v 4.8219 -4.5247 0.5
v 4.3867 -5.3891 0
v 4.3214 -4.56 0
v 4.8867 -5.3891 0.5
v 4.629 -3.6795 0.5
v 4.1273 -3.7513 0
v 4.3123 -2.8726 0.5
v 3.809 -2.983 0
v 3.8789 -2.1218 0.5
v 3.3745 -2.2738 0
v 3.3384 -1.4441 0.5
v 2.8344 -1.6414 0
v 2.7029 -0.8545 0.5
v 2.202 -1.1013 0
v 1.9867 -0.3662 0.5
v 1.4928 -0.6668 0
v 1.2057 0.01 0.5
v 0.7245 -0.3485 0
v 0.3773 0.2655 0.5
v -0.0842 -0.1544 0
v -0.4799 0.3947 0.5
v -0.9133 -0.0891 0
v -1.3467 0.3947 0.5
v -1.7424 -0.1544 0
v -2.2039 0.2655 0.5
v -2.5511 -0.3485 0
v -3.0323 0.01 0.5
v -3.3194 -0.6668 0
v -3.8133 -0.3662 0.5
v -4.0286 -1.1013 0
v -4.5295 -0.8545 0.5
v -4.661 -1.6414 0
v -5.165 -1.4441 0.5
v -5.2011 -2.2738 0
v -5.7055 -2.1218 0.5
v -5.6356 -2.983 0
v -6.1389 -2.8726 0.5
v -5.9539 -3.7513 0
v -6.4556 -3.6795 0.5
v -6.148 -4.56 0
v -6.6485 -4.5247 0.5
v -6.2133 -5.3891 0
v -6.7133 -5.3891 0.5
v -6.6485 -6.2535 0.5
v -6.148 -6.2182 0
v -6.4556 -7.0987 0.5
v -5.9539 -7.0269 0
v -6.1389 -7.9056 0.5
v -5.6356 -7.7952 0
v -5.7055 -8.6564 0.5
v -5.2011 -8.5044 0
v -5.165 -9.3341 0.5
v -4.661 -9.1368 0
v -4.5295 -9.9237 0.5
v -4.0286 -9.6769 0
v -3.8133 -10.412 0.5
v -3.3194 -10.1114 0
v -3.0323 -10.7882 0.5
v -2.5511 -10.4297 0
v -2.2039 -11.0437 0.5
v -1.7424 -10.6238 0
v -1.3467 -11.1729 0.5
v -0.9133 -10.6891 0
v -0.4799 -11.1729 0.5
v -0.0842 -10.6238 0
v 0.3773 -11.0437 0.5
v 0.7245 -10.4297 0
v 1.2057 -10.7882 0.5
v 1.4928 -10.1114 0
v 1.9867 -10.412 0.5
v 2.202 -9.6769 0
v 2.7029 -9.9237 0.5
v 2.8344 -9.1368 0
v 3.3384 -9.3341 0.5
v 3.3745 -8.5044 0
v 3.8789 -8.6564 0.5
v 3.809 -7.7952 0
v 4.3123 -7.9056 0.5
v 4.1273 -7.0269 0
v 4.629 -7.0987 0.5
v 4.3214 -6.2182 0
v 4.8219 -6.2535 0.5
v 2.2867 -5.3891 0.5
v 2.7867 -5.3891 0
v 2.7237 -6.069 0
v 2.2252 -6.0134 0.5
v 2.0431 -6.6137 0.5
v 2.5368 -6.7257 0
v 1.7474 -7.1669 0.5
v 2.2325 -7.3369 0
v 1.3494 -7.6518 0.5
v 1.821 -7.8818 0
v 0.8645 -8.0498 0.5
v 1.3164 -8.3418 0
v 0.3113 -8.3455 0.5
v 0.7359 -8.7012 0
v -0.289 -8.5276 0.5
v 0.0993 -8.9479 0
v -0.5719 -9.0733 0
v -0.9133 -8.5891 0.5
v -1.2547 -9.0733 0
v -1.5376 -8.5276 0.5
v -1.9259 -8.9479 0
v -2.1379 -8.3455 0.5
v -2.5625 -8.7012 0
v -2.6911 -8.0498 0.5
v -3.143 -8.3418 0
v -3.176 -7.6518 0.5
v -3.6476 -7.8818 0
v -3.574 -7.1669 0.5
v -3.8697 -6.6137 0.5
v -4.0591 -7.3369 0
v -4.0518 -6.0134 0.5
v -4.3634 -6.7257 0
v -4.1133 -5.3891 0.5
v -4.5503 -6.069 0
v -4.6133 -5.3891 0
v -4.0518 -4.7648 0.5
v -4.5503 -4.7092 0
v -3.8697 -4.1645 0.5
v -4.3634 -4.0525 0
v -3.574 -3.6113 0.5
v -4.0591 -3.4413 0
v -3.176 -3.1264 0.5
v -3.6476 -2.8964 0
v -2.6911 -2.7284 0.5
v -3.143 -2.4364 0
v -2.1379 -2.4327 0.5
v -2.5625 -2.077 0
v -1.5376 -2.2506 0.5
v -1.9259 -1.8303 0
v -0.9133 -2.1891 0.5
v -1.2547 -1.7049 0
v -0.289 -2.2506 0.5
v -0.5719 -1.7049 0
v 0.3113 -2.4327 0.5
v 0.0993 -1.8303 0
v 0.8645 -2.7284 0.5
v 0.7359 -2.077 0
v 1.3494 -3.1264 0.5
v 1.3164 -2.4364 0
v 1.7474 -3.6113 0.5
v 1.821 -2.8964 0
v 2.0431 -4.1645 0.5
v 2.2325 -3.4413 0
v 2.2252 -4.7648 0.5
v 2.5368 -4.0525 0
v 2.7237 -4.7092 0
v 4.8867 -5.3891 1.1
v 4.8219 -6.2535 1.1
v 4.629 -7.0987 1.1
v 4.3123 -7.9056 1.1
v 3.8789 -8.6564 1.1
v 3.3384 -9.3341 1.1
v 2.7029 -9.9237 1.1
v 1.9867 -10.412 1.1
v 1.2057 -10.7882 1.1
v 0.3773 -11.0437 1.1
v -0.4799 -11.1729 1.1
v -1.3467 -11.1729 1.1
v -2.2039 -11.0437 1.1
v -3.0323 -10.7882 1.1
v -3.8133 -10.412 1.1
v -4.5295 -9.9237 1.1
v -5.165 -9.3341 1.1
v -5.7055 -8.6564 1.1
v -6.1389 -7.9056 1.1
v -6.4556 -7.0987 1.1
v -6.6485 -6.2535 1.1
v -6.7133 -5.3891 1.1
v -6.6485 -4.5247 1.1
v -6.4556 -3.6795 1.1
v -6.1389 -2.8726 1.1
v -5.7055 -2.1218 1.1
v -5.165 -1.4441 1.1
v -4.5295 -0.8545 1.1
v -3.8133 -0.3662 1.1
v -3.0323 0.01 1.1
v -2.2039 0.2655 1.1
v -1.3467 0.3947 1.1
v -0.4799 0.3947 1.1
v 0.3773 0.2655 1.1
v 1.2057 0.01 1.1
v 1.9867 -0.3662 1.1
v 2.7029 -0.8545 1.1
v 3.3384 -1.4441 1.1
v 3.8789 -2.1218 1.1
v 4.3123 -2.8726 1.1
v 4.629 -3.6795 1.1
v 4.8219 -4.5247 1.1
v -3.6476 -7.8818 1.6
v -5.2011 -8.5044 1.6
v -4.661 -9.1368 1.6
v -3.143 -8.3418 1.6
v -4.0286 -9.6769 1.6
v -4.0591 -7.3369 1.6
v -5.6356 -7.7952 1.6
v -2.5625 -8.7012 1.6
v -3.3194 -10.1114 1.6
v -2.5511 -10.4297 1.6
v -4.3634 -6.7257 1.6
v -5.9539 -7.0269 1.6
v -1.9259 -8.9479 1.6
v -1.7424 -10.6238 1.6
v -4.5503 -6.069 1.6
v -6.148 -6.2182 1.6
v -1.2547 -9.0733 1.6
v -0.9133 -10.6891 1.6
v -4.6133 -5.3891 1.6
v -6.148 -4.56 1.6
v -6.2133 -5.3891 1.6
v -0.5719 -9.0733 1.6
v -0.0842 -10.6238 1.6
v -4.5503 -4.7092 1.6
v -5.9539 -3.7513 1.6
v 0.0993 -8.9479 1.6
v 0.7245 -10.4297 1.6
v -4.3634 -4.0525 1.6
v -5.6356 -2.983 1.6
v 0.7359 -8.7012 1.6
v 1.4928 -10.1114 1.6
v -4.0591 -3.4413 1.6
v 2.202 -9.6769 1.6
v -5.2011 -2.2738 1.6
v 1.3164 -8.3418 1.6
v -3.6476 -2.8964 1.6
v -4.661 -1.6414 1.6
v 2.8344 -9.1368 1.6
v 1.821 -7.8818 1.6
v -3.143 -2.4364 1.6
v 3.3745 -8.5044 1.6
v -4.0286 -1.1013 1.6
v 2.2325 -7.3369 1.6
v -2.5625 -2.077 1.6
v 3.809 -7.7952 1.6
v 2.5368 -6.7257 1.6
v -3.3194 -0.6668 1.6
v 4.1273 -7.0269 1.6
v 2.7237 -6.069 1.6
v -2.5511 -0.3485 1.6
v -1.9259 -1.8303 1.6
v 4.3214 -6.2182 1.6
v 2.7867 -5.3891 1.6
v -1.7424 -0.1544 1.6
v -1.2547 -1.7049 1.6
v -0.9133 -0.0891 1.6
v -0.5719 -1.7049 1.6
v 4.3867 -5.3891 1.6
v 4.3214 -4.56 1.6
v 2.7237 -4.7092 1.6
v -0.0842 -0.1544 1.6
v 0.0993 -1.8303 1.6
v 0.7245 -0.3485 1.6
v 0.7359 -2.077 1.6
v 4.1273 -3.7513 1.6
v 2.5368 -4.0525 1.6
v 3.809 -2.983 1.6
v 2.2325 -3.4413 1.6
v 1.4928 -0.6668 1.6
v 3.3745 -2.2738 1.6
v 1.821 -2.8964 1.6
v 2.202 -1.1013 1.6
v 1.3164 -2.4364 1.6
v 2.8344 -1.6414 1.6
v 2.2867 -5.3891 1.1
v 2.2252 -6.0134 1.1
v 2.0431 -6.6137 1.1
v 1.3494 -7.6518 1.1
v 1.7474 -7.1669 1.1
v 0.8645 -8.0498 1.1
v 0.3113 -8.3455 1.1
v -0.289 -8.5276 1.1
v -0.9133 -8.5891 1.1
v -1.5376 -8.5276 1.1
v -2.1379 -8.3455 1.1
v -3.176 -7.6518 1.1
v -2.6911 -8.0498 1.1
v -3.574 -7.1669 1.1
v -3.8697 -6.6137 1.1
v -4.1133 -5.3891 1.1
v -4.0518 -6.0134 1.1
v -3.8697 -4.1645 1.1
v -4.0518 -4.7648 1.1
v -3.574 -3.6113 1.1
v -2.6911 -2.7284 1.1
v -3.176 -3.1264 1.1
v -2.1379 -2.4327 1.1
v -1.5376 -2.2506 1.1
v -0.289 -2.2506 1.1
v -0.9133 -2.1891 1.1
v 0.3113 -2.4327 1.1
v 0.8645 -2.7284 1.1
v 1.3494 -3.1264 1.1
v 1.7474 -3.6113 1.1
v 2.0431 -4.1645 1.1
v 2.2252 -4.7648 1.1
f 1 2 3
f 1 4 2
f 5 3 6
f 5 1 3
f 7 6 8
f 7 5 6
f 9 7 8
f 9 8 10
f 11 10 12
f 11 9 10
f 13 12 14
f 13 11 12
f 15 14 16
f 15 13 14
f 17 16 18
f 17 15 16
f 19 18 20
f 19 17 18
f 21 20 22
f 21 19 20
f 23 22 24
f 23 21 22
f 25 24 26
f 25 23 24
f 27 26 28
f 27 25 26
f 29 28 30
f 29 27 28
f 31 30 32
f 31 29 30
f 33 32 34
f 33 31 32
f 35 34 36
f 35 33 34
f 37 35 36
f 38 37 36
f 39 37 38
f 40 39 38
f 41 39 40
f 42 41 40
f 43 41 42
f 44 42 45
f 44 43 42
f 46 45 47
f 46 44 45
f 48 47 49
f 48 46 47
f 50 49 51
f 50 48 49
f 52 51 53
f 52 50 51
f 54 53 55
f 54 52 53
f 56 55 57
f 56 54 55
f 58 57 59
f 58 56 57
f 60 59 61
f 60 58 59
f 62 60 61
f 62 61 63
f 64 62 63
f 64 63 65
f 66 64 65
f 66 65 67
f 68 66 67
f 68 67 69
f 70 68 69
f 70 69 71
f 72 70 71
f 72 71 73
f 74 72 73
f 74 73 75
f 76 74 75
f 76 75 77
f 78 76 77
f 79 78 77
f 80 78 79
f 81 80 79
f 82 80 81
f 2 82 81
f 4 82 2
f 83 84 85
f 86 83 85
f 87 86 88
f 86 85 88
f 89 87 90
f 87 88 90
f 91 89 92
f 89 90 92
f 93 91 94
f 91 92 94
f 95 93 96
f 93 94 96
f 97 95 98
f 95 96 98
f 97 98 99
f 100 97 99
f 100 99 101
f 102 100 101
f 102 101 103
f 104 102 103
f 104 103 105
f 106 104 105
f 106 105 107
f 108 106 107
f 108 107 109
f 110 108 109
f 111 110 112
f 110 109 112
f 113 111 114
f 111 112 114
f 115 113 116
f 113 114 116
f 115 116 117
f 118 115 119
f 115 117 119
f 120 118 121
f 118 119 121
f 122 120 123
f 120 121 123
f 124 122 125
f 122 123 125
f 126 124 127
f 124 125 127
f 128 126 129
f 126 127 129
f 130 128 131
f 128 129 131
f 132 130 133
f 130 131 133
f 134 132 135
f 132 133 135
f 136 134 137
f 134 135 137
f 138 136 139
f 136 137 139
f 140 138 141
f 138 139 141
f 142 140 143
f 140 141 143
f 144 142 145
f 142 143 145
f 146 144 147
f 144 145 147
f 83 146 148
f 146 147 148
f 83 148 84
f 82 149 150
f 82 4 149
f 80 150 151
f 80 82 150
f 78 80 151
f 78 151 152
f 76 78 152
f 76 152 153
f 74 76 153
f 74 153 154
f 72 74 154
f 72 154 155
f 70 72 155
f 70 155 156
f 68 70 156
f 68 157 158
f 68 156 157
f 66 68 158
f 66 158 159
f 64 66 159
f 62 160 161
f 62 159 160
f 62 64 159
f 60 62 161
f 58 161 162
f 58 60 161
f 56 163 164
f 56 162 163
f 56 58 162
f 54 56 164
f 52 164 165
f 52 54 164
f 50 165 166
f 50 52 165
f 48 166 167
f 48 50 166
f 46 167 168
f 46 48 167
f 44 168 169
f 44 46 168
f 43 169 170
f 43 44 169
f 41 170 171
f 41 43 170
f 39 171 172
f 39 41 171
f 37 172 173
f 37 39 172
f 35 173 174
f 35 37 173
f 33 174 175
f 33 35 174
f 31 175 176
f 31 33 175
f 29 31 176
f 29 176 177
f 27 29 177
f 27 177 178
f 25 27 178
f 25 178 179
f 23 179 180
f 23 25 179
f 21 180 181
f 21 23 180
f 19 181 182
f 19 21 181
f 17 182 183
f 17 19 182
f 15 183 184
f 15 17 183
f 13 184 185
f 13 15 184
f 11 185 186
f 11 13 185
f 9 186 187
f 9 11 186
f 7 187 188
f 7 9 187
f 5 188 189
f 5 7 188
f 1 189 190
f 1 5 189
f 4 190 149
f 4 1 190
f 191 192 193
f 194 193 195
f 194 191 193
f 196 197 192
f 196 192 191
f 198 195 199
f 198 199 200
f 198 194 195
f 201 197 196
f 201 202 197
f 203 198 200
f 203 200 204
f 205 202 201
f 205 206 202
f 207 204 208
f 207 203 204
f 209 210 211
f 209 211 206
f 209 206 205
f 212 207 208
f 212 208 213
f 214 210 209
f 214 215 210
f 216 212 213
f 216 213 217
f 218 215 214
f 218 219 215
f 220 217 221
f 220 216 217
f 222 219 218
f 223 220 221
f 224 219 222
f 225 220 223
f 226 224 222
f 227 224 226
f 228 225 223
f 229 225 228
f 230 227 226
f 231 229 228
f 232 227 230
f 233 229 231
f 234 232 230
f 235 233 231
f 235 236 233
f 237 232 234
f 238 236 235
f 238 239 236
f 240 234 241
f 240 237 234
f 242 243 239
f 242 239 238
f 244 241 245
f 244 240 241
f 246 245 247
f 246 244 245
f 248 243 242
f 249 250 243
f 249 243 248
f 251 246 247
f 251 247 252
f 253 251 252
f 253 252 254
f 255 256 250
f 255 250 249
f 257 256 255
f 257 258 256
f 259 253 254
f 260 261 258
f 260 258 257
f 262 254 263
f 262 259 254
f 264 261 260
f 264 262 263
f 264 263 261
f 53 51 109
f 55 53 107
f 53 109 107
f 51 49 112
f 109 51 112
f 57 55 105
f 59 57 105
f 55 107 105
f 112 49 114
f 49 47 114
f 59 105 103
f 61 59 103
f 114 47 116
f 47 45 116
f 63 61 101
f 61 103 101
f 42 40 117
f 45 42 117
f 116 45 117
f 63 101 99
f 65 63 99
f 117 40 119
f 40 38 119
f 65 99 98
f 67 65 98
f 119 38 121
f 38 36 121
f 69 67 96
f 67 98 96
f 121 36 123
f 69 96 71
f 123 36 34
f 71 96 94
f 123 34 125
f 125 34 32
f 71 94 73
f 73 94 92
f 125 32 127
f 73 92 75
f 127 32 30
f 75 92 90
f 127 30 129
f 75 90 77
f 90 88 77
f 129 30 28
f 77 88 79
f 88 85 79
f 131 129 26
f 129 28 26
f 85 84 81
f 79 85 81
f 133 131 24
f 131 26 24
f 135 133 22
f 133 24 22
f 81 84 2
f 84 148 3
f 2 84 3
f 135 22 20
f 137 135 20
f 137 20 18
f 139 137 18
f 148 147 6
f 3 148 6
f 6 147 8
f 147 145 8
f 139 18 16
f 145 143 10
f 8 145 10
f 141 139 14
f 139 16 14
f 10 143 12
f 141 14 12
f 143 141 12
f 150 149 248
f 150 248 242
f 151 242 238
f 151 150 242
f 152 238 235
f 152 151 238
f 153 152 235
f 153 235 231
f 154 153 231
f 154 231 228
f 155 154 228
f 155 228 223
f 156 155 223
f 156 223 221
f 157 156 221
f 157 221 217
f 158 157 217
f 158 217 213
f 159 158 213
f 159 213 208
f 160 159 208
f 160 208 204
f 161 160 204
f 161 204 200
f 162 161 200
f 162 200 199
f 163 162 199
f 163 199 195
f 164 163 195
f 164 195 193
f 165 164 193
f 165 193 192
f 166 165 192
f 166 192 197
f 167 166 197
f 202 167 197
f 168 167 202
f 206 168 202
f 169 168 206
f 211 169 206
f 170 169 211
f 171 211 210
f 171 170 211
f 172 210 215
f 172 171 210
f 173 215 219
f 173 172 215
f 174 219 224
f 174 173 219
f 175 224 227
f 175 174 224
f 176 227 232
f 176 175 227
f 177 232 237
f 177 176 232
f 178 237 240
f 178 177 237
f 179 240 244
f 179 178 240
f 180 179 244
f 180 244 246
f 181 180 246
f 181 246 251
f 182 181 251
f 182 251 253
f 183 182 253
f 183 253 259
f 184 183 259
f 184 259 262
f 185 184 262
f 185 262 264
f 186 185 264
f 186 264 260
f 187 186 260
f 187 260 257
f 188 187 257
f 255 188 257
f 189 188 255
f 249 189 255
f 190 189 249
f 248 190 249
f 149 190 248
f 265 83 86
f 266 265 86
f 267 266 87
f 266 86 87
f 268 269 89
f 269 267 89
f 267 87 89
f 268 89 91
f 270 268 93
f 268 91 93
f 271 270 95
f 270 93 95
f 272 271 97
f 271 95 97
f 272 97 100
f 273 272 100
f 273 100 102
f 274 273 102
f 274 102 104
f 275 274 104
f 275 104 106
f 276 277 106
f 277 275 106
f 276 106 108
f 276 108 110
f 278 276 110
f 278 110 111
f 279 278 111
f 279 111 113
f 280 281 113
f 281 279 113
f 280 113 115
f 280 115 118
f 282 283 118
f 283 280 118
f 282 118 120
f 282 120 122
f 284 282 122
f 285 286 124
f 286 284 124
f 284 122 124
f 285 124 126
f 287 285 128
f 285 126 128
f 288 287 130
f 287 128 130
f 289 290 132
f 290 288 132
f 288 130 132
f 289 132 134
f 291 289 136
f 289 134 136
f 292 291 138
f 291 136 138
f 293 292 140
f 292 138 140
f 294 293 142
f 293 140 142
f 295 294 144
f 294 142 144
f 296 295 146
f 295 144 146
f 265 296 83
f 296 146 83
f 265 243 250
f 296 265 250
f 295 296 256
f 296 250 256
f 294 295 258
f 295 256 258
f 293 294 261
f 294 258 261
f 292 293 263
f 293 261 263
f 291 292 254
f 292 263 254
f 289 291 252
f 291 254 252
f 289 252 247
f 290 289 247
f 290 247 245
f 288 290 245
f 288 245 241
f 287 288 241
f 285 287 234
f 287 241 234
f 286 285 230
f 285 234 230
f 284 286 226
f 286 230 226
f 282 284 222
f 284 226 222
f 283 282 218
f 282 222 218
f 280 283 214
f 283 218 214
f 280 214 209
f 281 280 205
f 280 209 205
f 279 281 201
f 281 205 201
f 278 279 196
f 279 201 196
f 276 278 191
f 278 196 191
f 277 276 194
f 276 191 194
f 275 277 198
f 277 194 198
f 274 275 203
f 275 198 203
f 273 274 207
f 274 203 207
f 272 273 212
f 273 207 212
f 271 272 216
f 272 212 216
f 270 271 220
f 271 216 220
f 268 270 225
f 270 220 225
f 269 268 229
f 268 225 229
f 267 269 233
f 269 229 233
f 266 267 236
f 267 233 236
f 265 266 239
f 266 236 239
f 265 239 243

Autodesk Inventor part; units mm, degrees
ref_plane "YZ Plane" through (0, 0, 0) normal (1, 0, 0) x (0, 1, 0)
ref_plane "XZ Plane" through (0, 0, 0) normal (0, 1, 0) x (-1, 0, 0)
ref_plane "XY Plane" through (0, 0, 0) normal (0, 0, 1) x (1, 0, 0)
ref_plane "Work Plane1" through (0, 0, 0) normal (0, 0, 1) x (1, 0, 0)
sketch "Sketch1" plane through (0, 0, 0) normal (0, 0, 1) x (1, 0, 0)
  circle A0 centre (-0.9133, -5.3891) radius 4 projected
  circle A1 centre (-0.9133, -5.3891) radius 3.8536 projected
  circle A2 centre (-0.9133, -5.3891) radius 5.8
  circle A3 centre (-0.9133, -5.3891) radius 3.2
  point P0 (0, 0)
  dimension "d0" = 1.8
  dimension "d6" = 6.4
extrude "Extrusion1" add sketch "Sketch1" along normal blind 1.6 contours A0 | A1 | A2
chamfer "Chamfer1" distance 0.5 angle 45 2 edges at (-6.7133, -5.3891, 1.6) (-6.7133, -5.3891, 0)
chamfer "Chamfer2" distance 0.5 angle 45 2 edges at (-4.1133, -5.3891, 0) (-4.1133, -5.3891, 1.6)
properties part number "washers"
